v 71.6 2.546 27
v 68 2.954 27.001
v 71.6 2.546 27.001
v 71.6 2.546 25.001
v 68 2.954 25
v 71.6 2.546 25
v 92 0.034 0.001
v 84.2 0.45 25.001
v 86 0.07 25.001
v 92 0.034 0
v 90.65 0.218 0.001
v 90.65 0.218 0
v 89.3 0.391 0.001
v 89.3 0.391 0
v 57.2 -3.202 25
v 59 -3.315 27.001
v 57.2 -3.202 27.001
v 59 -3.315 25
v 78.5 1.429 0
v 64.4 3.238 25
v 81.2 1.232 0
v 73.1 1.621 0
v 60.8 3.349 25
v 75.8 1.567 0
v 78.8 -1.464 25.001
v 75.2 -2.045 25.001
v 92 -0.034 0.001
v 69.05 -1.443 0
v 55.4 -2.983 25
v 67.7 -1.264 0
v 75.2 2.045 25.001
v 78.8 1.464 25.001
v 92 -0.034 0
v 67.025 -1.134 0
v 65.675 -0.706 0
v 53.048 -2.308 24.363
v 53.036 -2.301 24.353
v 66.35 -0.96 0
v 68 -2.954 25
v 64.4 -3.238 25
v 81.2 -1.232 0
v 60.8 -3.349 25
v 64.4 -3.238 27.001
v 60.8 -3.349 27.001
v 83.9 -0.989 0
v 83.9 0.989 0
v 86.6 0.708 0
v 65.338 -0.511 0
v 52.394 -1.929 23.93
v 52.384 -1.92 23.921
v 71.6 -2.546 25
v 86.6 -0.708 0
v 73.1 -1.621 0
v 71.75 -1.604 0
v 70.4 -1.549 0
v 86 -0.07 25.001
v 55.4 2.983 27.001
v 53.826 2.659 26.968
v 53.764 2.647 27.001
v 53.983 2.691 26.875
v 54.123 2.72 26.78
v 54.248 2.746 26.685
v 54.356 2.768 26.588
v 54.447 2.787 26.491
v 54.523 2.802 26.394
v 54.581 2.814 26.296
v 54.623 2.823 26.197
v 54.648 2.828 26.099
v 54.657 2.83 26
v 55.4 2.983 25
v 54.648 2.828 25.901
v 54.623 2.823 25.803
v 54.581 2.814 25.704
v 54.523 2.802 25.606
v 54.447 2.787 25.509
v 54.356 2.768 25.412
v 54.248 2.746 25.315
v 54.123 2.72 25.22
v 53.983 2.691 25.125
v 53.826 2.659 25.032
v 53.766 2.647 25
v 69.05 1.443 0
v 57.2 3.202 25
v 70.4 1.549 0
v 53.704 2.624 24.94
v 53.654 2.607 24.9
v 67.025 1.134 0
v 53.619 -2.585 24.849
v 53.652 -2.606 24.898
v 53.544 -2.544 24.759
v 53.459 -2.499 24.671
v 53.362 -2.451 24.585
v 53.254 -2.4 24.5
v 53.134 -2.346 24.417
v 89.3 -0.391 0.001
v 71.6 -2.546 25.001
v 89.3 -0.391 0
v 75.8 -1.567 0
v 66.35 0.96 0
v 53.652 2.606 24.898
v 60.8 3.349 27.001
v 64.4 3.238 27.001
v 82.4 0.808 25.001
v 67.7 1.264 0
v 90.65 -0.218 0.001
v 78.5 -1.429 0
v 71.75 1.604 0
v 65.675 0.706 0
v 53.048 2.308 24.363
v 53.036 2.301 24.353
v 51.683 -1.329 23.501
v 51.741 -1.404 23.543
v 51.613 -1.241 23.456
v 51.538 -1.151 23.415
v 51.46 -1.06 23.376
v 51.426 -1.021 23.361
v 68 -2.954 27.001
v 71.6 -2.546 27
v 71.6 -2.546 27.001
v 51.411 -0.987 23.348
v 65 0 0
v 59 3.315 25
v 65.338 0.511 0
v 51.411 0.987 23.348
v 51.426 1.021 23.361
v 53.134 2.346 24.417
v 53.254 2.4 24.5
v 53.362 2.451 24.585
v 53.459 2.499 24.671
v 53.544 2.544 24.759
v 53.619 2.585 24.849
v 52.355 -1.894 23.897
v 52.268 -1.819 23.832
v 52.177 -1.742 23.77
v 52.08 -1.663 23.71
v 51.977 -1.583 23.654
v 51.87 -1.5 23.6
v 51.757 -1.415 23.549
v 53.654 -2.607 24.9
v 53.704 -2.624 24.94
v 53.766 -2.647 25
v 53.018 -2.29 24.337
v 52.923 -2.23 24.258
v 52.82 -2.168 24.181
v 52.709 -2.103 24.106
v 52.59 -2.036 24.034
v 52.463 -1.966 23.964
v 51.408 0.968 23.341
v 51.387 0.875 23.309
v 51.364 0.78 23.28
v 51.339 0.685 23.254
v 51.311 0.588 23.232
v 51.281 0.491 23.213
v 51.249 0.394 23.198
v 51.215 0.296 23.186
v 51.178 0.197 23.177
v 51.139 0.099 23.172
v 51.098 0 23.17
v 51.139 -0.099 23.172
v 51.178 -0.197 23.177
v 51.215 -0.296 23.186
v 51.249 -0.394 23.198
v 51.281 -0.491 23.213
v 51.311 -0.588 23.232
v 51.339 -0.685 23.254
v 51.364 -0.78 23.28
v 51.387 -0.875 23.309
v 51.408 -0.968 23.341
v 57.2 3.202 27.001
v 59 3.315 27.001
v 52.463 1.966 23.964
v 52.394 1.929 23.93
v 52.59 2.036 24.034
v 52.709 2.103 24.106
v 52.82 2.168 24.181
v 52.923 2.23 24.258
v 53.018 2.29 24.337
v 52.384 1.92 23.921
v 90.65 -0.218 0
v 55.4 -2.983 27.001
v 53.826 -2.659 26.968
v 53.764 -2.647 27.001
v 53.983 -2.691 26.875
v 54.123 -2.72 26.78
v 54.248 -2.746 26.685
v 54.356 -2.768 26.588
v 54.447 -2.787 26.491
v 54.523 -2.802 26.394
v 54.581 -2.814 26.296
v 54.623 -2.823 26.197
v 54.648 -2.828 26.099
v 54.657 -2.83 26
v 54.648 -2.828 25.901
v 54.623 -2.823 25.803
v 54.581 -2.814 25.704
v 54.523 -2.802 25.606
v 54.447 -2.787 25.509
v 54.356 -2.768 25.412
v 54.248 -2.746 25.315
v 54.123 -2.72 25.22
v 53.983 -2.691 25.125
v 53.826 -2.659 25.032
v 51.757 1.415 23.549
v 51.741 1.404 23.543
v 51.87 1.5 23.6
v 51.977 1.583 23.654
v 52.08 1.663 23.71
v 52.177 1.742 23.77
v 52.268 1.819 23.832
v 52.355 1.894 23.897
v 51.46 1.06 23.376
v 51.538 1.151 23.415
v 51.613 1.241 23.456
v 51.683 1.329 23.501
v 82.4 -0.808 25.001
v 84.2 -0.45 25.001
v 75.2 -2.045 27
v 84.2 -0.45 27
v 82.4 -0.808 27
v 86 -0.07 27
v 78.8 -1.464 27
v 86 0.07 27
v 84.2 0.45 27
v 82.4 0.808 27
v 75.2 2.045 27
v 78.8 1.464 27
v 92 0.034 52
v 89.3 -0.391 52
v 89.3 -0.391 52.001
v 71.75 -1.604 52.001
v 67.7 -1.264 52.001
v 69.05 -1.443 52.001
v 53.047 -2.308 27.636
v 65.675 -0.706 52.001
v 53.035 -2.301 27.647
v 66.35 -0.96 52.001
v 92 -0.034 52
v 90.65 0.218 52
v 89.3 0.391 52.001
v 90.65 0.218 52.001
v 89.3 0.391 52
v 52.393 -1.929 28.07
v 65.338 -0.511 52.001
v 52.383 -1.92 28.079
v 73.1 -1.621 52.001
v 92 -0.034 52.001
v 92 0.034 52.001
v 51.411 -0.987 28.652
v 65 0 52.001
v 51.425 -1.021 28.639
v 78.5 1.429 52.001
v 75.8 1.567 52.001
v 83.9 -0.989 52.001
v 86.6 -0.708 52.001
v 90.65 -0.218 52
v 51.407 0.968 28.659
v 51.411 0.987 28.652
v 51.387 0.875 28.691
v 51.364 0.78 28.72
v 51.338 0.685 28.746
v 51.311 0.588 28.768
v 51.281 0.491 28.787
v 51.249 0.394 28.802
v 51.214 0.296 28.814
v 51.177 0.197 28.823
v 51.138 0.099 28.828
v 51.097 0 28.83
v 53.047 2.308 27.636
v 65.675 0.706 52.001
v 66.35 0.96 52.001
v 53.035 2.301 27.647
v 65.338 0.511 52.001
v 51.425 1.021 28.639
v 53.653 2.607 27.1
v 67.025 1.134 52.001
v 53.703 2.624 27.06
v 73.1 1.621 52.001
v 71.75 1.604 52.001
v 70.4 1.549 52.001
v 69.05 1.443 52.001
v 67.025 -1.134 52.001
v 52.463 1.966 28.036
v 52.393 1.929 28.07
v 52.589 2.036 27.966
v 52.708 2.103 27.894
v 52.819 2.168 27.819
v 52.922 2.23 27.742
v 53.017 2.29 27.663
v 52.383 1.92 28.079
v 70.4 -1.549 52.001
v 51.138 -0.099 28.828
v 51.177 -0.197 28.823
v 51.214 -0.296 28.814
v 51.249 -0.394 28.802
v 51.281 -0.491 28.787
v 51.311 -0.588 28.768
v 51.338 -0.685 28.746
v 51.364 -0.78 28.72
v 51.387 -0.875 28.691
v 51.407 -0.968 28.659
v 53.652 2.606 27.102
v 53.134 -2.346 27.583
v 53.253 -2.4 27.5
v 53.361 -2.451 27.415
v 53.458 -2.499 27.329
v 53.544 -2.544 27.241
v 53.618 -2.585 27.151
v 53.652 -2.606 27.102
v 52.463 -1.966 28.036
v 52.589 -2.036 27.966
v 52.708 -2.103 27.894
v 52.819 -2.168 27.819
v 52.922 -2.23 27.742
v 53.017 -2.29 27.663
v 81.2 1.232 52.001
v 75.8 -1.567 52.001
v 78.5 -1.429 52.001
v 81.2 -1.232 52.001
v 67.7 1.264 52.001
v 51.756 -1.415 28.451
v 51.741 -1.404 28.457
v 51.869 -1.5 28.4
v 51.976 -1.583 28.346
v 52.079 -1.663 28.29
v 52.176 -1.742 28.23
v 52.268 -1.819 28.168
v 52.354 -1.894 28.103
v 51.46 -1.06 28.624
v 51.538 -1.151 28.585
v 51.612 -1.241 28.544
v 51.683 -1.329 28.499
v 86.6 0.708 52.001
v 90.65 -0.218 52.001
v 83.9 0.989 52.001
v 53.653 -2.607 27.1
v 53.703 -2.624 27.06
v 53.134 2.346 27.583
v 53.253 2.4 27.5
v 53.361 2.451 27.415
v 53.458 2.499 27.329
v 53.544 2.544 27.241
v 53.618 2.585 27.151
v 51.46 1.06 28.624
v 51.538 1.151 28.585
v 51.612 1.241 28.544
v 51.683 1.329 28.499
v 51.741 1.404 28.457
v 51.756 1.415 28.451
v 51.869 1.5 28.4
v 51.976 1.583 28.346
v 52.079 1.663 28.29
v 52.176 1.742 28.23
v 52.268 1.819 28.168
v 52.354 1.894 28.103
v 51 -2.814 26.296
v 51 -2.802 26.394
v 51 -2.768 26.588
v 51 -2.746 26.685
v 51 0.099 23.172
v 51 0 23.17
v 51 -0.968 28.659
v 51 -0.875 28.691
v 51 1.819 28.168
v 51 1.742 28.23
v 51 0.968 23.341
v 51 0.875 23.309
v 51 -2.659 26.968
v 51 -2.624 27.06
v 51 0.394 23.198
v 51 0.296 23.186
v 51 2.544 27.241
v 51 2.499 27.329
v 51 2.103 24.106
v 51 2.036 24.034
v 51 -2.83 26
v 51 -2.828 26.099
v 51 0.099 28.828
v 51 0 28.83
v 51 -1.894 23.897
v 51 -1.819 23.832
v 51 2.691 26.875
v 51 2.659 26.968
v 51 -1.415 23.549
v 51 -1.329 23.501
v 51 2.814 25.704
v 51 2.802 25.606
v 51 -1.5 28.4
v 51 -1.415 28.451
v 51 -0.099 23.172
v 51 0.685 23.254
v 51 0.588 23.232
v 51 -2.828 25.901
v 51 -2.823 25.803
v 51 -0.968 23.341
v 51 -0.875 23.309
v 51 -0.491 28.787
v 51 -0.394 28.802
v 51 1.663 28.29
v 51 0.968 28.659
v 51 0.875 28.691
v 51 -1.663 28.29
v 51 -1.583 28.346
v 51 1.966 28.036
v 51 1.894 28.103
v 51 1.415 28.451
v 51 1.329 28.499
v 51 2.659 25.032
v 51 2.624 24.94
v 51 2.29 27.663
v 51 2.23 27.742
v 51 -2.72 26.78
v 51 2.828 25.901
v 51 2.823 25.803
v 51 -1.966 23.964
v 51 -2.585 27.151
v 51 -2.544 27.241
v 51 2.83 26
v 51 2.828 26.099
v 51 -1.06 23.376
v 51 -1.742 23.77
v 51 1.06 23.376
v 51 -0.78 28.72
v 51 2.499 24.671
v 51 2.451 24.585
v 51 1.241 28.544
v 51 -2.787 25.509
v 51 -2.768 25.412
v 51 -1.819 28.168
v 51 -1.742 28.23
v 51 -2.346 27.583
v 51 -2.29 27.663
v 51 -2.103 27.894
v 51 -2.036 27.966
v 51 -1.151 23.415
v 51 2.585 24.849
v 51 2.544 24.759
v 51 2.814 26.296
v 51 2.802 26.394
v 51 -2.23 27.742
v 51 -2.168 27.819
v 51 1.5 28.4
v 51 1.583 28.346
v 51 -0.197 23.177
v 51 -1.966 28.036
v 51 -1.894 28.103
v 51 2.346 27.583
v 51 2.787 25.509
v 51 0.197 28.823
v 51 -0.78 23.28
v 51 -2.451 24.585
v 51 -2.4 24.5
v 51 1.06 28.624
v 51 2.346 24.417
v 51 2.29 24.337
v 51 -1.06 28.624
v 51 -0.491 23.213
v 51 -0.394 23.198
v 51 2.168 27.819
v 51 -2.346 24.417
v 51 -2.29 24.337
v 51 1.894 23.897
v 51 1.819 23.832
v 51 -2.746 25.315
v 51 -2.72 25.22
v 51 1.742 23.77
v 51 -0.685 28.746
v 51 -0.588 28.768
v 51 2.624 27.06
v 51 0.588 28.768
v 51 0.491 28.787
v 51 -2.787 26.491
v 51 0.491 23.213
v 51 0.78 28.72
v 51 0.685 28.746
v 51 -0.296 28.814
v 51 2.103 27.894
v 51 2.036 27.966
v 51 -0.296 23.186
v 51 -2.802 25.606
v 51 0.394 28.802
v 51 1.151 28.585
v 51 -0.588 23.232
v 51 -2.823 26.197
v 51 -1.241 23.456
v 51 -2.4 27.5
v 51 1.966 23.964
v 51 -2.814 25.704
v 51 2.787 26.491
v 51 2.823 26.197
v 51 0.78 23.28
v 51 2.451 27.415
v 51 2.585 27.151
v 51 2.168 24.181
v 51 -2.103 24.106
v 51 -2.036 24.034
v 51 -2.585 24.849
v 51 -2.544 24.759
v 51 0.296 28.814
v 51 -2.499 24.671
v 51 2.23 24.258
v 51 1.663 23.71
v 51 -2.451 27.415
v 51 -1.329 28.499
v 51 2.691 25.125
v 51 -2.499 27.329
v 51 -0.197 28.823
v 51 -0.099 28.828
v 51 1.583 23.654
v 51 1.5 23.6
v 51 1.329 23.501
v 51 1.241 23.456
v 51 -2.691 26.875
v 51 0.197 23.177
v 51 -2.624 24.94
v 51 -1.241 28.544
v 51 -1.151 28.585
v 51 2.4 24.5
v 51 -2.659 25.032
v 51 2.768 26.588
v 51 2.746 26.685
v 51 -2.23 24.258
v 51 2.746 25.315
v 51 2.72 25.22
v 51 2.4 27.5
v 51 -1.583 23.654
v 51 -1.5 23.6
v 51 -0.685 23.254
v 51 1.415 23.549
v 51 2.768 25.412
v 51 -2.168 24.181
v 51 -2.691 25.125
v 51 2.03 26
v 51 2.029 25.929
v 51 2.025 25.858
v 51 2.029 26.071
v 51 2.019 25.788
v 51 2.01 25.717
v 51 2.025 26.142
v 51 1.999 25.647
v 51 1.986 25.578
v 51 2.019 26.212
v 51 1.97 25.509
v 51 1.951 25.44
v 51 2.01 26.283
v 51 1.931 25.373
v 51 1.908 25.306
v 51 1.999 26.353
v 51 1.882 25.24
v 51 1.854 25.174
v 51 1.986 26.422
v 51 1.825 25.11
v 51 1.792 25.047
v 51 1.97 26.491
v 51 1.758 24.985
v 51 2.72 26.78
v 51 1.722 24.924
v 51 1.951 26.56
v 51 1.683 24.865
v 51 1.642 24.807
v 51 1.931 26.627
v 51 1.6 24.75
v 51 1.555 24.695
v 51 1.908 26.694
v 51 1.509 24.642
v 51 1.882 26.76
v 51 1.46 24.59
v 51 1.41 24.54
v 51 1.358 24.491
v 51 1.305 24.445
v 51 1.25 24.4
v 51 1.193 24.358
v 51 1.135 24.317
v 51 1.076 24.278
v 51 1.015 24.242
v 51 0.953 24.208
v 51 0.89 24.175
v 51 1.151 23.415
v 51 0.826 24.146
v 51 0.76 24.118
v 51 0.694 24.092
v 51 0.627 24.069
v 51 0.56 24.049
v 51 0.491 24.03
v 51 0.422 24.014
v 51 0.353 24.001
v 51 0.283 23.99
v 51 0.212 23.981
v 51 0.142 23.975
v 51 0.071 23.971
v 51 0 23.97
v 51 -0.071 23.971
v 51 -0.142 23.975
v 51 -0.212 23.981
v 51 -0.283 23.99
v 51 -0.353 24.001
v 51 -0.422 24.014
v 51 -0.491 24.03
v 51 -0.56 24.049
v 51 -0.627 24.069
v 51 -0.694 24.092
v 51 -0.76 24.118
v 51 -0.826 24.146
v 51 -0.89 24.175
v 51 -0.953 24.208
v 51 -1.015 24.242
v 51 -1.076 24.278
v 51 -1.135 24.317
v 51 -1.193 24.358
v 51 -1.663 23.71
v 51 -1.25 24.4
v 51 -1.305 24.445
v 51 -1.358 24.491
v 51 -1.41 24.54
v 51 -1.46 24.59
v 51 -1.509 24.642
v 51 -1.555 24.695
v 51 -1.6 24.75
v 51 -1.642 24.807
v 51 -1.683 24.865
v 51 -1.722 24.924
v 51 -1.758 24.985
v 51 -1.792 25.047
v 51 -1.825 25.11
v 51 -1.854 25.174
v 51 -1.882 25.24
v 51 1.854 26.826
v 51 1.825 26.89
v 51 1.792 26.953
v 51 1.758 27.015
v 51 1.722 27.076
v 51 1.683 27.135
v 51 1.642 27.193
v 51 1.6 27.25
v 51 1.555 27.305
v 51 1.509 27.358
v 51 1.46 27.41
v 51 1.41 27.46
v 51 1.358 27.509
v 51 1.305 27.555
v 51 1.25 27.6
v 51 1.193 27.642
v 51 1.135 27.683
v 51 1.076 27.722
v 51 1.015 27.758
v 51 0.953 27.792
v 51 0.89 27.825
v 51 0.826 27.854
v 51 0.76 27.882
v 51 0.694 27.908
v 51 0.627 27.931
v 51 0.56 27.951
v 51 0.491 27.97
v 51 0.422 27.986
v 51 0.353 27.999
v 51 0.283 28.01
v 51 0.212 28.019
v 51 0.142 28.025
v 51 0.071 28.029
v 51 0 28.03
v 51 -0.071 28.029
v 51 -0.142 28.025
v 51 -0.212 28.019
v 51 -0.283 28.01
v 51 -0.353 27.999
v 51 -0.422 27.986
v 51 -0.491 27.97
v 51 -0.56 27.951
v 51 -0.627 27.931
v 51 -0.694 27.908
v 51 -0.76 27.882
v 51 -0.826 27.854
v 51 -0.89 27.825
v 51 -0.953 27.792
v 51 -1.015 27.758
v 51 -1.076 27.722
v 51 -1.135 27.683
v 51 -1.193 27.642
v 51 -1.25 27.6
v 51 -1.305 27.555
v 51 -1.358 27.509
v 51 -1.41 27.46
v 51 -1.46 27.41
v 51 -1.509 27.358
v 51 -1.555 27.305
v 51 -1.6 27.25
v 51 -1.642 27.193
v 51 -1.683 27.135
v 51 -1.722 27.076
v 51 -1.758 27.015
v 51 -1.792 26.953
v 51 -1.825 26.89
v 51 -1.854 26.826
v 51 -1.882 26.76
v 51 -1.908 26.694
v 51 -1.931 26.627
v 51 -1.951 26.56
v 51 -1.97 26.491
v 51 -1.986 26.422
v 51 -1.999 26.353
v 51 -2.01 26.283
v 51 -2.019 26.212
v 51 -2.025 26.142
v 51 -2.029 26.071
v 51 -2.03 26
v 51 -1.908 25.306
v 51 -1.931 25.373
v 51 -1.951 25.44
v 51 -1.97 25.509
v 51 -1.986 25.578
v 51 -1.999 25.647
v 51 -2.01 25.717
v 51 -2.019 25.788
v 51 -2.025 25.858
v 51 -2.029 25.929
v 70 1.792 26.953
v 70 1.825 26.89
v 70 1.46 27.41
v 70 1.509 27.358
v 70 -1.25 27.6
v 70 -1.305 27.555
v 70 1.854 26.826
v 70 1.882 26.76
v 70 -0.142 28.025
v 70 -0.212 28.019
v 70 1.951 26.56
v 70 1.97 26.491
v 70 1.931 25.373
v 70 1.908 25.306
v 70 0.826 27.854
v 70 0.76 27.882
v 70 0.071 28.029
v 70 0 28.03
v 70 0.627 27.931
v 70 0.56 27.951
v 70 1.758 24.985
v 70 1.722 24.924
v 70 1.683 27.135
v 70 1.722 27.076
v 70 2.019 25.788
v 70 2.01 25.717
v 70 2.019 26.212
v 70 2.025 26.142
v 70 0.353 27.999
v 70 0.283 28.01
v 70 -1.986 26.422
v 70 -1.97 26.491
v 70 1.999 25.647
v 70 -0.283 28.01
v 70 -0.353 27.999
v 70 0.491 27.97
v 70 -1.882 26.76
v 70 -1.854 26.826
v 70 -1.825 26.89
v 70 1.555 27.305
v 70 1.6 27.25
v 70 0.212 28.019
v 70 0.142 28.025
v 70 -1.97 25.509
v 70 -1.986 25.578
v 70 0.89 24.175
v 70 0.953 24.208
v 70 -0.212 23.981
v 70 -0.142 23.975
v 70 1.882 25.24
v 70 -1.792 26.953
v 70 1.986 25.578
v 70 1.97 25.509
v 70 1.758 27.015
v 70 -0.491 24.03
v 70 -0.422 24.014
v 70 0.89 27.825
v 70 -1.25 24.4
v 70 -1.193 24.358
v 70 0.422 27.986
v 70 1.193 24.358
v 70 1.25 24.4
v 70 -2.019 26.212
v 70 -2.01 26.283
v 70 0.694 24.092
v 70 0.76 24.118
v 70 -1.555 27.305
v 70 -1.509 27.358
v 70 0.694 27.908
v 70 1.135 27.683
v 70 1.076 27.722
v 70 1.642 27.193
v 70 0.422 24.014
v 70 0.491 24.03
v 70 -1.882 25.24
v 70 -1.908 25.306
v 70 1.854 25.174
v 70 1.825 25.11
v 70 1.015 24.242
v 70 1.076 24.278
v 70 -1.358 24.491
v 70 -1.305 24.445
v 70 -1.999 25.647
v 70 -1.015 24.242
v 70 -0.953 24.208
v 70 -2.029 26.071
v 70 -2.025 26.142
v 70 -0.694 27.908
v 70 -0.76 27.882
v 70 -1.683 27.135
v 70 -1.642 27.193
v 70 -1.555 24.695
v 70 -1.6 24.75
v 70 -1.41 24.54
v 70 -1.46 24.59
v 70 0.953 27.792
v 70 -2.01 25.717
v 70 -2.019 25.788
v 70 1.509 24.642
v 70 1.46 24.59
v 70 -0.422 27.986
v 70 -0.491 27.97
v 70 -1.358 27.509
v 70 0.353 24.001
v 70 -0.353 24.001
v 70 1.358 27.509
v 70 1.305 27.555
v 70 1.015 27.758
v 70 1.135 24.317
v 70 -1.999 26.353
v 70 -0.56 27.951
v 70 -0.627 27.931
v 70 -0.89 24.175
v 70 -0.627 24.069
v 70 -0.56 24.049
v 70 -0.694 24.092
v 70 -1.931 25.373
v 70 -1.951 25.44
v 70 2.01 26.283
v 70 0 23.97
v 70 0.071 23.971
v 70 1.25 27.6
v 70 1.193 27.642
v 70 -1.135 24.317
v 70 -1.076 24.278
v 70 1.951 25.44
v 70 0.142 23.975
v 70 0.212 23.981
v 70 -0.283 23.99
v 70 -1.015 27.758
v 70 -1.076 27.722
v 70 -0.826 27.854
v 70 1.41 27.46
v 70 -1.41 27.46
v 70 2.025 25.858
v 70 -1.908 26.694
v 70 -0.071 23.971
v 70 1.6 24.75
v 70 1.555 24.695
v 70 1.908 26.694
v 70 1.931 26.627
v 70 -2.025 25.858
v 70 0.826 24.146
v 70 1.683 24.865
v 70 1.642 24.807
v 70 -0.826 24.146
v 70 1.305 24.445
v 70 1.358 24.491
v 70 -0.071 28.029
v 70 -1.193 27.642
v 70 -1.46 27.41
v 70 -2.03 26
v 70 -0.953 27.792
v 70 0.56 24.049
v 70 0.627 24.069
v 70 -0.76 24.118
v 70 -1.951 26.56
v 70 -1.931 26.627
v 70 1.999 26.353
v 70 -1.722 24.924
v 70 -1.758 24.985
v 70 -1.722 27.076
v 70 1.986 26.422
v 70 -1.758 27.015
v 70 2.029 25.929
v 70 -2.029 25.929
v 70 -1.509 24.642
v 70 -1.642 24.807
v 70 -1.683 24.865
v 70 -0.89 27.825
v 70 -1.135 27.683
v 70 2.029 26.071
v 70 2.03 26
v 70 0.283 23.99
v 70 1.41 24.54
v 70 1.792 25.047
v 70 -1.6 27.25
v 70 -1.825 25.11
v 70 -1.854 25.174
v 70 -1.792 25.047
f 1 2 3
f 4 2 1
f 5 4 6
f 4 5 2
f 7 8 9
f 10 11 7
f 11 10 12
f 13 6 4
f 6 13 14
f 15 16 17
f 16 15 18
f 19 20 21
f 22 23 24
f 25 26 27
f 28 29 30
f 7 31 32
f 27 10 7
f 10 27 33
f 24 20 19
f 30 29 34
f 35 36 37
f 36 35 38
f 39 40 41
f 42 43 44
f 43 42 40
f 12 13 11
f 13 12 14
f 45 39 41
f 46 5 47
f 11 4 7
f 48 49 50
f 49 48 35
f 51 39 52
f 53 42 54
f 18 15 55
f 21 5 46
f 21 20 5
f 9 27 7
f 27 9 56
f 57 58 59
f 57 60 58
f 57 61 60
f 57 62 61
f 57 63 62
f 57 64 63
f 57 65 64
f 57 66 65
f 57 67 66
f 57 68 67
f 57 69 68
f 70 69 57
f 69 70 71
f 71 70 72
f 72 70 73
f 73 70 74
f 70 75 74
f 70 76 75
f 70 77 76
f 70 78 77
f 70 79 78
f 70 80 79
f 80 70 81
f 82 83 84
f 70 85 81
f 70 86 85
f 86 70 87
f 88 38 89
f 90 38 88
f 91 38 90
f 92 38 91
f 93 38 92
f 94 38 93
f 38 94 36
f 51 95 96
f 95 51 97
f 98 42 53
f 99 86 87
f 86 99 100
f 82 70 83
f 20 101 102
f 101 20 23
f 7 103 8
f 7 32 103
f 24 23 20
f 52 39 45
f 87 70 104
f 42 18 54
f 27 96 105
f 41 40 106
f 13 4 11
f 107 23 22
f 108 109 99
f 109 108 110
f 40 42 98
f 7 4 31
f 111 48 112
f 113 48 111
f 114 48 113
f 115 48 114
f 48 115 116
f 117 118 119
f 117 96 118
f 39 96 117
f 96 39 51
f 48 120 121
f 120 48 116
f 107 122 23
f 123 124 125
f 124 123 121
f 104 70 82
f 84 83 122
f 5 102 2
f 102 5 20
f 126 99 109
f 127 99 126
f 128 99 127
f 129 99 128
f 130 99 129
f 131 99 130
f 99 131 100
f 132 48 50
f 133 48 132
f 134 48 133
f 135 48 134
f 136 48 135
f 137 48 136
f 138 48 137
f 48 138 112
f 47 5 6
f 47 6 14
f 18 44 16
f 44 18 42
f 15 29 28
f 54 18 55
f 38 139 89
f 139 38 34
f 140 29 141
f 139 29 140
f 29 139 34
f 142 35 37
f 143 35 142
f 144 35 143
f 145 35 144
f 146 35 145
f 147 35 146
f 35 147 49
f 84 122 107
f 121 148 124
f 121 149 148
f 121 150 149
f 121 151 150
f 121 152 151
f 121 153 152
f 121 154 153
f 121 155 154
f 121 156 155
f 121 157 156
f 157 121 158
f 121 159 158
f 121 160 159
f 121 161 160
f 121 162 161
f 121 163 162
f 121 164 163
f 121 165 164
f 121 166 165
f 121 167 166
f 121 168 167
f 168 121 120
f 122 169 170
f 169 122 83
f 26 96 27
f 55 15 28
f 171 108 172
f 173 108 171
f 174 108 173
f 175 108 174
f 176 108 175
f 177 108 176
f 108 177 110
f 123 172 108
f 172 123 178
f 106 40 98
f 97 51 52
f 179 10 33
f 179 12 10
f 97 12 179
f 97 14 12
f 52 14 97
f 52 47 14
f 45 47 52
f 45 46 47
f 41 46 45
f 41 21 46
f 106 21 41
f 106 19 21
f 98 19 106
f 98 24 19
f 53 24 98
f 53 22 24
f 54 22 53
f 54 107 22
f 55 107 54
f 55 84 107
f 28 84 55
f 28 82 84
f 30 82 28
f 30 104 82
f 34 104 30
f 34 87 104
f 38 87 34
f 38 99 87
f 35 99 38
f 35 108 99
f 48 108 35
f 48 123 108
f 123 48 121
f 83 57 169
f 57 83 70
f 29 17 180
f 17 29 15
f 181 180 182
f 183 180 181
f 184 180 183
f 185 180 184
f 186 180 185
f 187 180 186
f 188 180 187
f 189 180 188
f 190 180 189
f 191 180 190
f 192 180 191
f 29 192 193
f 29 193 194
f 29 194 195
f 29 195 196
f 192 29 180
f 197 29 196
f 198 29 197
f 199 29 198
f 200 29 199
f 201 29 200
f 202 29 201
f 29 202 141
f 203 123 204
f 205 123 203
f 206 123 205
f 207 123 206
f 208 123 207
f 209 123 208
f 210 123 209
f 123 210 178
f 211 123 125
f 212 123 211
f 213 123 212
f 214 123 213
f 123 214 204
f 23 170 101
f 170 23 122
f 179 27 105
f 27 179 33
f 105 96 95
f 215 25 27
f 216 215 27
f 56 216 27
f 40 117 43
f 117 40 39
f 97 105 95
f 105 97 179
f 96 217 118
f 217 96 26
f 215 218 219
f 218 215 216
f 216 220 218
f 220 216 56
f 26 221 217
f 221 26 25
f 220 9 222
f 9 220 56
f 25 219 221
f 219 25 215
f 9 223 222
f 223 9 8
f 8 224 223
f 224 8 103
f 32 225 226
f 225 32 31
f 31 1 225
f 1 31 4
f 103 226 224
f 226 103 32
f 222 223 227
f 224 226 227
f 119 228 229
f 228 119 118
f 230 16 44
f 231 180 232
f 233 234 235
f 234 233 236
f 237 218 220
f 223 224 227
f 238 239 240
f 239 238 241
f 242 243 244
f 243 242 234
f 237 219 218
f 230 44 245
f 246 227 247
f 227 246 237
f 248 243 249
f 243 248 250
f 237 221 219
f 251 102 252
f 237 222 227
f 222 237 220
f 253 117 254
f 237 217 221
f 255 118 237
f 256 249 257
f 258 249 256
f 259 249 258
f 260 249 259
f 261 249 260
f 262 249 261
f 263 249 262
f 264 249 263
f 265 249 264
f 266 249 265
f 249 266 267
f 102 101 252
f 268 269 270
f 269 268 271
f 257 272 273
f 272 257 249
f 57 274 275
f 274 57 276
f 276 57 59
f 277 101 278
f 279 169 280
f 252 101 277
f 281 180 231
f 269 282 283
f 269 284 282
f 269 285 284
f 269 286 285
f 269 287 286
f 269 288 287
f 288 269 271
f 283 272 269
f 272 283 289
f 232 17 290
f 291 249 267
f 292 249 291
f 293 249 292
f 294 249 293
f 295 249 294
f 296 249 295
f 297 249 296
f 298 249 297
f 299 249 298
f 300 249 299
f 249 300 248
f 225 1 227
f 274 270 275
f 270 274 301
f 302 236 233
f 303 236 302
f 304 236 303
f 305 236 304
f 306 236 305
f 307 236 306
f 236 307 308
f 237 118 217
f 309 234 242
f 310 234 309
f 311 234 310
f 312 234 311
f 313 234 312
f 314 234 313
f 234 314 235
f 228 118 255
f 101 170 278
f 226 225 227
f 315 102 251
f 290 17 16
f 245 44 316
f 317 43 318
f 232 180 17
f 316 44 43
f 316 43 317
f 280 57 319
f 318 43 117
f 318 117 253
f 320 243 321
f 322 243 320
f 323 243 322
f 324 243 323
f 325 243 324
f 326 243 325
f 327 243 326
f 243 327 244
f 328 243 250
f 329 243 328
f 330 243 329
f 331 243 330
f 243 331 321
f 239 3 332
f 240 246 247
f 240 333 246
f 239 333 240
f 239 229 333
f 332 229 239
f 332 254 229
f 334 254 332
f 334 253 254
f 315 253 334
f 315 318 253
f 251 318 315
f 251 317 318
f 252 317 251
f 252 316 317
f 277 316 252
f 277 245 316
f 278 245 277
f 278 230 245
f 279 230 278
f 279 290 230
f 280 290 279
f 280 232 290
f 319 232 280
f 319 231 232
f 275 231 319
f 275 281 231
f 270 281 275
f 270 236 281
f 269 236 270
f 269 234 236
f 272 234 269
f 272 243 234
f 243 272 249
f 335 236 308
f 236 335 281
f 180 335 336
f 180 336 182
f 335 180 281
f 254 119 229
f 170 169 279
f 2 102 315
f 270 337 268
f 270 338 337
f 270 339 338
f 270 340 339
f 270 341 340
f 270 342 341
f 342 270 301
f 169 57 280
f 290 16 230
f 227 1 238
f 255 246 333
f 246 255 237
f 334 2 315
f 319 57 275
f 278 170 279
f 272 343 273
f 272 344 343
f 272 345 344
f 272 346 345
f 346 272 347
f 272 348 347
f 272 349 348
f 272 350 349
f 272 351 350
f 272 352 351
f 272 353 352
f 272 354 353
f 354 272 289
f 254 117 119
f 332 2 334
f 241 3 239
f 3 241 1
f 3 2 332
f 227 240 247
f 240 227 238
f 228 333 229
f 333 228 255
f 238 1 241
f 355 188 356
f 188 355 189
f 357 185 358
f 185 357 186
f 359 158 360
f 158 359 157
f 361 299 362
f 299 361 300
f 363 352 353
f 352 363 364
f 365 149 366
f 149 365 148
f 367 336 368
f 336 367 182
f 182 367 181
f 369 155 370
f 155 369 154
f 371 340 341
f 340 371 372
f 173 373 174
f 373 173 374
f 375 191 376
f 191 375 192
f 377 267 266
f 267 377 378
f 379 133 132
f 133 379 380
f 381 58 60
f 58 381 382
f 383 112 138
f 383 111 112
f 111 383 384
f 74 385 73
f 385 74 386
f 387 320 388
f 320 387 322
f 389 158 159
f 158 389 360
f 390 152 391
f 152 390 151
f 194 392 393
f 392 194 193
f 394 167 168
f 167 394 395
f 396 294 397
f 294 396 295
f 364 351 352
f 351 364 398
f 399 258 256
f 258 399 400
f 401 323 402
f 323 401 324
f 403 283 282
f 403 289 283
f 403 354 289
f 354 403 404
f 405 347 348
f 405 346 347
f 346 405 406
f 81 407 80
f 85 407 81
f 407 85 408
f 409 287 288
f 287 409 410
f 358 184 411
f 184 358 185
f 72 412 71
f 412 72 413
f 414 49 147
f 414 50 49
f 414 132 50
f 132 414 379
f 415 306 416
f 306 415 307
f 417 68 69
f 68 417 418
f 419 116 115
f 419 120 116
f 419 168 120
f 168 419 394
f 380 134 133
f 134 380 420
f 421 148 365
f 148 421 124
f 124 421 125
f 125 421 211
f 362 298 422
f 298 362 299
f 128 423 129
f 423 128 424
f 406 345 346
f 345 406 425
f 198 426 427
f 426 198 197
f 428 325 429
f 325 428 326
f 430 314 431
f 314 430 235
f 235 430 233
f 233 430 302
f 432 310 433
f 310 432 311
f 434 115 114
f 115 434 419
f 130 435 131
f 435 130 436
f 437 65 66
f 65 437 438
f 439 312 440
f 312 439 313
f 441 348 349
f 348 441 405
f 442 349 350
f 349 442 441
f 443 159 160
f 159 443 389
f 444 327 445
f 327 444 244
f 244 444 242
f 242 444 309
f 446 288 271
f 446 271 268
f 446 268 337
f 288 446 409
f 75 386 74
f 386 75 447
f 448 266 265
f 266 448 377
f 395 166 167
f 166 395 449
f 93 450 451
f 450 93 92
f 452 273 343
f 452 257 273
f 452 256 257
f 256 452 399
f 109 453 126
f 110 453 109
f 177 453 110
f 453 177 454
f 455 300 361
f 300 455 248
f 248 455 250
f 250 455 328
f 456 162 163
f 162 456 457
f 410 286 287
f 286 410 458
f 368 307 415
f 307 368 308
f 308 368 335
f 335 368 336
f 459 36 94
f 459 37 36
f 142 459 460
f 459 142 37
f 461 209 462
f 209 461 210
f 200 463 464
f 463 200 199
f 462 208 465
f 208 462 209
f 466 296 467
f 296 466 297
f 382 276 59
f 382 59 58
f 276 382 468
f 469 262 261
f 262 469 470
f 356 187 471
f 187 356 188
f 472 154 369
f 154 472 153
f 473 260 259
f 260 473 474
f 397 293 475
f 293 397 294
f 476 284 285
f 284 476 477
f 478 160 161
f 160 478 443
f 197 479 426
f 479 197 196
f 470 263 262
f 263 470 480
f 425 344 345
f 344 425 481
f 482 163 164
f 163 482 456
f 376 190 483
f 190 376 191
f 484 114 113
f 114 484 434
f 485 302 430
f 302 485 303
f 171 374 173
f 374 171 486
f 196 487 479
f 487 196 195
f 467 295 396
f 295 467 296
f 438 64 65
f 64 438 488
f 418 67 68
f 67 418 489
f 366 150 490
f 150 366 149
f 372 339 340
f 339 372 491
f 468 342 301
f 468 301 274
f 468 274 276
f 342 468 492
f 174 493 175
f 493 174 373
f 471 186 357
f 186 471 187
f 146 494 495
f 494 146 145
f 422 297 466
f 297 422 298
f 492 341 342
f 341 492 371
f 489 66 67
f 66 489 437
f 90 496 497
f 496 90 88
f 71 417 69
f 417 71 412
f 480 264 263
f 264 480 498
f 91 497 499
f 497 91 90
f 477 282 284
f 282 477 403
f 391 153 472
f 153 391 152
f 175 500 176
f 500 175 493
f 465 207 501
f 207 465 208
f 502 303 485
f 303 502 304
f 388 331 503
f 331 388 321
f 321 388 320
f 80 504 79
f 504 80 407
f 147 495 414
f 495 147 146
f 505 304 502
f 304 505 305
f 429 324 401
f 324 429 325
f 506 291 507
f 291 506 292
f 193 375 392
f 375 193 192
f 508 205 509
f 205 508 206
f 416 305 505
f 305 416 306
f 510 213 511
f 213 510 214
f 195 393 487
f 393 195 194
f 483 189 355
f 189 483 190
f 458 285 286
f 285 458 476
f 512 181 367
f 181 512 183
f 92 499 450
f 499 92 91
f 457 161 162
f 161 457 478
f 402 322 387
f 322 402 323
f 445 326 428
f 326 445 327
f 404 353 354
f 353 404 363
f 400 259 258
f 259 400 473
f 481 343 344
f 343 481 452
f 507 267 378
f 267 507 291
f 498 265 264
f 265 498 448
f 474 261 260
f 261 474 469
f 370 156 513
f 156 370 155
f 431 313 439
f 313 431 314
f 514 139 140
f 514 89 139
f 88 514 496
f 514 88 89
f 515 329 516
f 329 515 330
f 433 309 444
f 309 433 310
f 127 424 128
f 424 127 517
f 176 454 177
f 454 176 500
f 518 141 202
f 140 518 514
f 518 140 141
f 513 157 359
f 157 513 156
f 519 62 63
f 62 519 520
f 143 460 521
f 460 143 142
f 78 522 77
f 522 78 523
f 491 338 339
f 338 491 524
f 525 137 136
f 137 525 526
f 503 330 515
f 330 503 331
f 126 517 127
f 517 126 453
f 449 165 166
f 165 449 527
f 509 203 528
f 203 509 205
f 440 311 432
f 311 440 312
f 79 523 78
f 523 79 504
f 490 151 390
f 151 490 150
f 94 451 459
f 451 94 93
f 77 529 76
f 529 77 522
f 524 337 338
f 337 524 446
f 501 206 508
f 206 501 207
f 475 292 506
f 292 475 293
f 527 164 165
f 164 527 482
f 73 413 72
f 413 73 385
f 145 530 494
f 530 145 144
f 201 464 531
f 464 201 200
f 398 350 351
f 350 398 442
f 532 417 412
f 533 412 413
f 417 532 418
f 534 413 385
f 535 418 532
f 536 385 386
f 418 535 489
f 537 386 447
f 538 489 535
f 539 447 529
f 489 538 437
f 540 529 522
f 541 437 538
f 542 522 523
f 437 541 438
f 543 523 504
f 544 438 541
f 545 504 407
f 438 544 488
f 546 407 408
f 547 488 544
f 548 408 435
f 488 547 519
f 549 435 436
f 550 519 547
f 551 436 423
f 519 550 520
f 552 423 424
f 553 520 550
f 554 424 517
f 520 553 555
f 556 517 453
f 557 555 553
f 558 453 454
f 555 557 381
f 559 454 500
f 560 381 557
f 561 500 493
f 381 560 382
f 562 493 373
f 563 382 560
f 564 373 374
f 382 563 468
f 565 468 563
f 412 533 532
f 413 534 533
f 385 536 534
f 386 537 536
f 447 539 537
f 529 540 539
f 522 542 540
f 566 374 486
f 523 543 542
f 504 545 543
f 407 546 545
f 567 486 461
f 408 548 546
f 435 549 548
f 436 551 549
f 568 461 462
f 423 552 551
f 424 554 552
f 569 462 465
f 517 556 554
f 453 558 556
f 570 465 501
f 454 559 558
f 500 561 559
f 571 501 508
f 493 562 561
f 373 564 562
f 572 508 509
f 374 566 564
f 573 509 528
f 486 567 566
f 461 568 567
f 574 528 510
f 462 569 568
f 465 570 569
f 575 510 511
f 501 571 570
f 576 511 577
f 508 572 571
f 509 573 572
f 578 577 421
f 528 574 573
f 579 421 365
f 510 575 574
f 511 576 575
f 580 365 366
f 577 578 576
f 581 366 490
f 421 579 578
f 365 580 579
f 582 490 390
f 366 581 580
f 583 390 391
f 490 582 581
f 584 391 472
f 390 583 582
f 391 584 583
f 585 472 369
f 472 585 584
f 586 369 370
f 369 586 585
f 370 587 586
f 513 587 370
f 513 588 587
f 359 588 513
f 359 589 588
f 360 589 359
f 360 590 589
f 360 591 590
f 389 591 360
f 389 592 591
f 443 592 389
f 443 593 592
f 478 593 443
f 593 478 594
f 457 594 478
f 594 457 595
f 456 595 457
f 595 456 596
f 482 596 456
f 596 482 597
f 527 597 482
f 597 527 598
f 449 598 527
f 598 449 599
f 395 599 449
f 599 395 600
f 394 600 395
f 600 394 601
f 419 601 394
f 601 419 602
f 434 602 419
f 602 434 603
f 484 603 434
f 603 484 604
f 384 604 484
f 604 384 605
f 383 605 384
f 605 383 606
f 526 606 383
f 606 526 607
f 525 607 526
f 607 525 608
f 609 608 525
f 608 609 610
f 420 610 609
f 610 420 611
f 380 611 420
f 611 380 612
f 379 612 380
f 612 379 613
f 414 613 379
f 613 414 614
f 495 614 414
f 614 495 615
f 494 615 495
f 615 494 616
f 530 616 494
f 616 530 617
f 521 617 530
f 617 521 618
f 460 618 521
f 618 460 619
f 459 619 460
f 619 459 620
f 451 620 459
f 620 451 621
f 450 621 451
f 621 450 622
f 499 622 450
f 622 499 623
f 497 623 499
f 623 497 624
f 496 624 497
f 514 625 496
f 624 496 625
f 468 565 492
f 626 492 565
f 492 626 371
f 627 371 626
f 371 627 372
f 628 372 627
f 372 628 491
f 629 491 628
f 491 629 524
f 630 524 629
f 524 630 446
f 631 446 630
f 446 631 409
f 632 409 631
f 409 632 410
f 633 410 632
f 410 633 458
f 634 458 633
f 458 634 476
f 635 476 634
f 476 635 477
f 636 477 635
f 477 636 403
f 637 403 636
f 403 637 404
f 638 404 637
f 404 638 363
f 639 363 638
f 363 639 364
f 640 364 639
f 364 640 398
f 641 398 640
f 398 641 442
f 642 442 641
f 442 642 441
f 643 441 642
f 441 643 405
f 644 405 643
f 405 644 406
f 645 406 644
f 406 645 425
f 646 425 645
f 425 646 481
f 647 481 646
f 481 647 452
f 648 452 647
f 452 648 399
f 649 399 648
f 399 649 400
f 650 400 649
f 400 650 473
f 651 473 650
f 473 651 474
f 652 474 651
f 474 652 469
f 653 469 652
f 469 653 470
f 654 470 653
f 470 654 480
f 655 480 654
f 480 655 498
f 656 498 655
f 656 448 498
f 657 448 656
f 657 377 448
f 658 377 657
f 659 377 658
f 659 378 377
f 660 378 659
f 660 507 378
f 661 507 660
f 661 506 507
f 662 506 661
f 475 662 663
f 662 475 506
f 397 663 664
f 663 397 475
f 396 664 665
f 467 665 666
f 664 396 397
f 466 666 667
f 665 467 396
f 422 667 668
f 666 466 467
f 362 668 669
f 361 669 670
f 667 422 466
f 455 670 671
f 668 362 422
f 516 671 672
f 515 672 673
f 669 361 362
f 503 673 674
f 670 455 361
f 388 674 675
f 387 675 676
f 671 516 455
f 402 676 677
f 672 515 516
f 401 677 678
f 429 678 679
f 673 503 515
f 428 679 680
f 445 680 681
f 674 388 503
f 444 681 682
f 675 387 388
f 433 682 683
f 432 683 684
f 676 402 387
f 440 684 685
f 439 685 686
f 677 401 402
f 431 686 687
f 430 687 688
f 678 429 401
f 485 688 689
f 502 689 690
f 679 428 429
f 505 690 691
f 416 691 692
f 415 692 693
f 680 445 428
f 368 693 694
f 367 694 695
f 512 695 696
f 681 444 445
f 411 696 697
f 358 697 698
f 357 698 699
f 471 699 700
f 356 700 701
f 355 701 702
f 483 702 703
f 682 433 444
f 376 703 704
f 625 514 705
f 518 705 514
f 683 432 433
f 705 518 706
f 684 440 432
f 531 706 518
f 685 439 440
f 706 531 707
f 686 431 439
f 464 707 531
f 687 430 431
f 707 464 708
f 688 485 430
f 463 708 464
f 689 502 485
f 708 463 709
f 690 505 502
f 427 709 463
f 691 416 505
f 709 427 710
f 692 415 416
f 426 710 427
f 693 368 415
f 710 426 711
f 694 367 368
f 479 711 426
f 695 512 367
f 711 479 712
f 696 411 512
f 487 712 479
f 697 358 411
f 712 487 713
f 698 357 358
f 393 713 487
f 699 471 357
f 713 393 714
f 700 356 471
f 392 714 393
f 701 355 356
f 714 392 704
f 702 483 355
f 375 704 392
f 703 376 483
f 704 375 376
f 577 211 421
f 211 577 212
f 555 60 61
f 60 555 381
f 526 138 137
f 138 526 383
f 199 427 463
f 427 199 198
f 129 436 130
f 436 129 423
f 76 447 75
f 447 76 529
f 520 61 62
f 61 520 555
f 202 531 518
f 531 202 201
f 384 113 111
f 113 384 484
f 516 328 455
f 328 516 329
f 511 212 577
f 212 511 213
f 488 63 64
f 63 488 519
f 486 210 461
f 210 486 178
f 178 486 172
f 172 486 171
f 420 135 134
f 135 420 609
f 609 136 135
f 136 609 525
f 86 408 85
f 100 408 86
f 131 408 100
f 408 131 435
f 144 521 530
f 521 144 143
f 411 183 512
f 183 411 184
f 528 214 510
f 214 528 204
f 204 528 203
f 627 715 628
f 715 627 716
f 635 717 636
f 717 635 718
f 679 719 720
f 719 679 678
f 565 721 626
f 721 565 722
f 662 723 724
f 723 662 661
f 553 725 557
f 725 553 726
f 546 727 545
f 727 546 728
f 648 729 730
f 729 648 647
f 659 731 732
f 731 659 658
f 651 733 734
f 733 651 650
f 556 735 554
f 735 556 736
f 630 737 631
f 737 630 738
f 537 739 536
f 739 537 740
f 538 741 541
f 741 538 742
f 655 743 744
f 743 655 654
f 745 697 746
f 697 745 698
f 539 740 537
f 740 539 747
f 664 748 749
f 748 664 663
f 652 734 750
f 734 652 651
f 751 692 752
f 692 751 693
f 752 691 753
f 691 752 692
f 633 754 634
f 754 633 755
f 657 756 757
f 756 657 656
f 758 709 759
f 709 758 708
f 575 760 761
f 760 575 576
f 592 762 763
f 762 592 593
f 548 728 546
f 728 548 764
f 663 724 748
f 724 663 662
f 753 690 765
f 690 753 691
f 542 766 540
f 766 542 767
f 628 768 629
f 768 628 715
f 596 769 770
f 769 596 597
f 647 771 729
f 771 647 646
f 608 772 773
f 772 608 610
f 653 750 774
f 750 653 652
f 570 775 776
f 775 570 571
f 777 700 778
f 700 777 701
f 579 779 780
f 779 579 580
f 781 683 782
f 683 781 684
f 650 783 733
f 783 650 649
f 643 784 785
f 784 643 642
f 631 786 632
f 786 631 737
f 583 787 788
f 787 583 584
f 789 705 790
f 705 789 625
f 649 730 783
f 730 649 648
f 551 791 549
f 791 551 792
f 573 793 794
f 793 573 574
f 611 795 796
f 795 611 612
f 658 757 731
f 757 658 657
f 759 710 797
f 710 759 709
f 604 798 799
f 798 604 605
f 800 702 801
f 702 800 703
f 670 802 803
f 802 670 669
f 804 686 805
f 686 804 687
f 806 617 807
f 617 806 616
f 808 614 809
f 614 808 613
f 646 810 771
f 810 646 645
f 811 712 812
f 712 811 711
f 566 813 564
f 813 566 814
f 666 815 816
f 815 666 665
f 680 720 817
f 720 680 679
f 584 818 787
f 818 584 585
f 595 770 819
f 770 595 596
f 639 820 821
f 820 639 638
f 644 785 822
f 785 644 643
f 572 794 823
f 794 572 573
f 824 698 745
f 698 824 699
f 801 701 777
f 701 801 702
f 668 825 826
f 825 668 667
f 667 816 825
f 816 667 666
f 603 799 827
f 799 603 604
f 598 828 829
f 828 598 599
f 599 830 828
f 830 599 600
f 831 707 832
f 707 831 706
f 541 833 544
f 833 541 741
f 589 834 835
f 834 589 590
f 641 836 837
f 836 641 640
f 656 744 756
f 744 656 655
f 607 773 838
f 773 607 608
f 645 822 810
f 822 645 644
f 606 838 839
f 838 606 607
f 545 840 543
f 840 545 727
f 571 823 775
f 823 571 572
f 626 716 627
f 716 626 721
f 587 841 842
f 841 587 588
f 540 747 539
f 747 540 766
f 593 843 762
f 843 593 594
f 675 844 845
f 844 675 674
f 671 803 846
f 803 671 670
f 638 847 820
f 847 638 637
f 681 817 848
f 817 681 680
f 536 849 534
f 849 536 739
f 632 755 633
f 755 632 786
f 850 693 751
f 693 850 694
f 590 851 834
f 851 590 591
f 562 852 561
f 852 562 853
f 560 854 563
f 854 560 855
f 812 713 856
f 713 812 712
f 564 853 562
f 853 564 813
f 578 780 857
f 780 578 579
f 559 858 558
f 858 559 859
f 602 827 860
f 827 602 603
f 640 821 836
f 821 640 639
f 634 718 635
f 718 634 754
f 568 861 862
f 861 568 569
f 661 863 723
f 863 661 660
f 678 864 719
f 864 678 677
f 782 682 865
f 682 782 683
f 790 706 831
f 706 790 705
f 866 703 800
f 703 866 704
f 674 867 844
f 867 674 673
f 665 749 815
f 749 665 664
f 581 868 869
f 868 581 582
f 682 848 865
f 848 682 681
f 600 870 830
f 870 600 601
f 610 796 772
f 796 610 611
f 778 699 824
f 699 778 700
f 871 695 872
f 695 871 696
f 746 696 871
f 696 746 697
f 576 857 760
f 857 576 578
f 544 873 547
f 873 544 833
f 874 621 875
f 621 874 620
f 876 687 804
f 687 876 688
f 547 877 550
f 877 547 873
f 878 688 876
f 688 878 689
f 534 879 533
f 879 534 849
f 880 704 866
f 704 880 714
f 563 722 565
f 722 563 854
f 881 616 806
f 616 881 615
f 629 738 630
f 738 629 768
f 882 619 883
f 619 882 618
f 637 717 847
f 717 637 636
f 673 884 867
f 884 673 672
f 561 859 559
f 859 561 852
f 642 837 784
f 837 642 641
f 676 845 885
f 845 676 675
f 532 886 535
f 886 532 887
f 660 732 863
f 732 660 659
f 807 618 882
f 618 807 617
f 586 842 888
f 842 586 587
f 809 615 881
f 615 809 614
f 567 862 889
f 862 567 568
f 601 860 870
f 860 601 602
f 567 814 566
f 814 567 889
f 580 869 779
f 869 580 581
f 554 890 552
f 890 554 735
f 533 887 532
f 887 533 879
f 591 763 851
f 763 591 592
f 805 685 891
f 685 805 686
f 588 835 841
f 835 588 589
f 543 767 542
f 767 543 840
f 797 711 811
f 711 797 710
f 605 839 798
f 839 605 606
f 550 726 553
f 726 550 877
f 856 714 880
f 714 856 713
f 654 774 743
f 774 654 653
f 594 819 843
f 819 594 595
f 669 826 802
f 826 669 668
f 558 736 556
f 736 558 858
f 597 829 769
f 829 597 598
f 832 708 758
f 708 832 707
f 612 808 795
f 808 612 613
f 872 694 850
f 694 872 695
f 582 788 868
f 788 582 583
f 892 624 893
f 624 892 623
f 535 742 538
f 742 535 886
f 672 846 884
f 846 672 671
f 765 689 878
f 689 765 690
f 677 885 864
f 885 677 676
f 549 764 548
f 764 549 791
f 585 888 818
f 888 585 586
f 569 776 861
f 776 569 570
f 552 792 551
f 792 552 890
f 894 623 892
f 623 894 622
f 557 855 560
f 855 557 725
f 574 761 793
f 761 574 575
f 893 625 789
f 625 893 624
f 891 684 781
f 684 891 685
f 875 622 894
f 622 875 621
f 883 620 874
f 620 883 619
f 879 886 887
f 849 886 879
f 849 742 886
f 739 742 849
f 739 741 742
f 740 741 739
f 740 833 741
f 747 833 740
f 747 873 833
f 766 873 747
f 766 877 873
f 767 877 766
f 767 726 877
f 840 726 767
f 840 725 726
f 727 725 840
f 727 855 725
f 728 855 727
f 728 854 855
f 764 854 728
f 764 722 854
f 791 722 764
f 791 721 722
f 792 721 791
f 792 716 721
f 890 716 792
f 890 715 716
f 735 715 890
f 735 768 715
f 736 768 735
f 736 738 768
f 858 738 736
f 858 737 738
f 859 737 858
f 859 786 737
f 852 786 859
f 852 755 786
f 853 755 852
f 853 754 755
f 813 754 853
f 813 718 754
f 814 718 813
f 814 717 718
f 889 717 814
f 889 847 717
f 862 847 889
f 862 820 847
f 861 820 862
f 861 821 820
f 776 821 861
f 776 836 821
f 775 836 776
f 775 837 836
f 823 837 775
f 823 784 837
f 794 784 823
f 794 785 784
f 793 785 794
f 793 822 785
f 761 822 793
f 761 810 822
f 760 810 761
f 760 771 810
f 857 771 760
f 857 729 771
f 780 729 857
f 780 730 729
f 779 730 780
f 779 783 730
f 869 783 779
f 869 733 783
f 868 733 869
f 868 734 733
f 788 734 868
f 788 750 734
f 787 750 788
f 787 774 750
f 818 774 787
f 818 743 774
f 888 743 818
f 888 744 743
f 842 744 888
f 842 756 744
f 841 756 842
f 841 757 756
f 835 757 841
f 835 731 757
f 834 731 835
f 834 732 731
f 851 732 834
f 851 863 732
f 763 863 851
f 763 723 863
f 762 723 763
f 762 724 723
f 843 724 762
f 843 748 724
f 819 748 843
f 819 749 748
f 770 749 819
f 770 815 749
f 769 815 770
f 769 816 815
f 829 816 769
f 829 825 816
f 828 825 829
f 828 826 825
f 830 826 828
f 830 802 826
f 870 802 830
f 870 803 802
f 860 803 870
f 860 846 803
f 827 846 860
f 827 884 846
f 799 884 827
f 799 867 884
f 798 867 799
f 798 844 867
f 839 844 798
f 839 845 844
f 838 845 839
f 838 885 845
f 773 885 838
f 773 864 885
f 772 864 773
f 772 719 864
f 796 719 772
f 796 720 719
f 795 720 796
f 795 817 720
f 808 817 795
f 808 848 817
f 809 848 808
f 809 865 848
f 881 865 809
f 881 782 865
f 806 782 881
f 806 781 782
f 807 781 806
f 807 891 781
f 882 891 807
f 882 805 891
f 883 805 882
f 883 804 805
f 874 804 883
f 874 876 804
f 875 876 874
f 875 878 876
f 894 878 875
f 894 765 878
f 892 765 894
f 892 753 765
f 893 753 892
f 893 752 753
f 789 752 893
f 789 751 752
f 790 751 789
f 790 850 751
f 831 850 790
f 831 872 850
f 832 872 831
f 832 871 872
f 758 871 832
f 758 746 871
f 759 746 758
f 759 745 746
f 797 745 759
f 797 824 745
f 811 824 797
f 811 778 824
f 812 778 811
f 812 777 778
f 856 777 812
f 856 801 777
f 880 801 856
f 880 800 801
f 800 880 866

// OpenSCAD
big = 1000;
lil = 0.001;
res = 1;

tail1OS = [65,0,0];
tail1Scale = [0.6, 0.3, 1];
tail2OS = [50,0,25];
tail2Scale = [0.8, 0.62, 1];
tail3OS = [65,0,50];
tail3Scale = [0.6, 0.3, 1];

gutsOS = [0,0,2];
gutsScale = [1, 0.4, 1];

rodOS = [60,0,tail2OS[2] + gutsOS[2]/2];
rodR = 2.03;
rodL = 9;
rodSkin = 0.8;

module tail2Pos(){
    
    chord_len = 45;
    NACA0024=[[1.0000,0.00252],[0.9500,0.01613],[0.9000,0.02896],[0.8000,0.05247],[0.7000,0.07328],[0.6000,0.09127],[0.5000,0.10588],[0.4000,0.11607],[0.3000,0.12004],[0.2500,0.11883],[0.2000,0.11475],[0.1500,0.10691],[0.1000,0.09365],[0.0750,0.08400],[0.0500,0.07109],[0.0250,0.05229],[0.0125,0.03788],[0.0000,0.00000],[0.0125,-0.03788],[0.0250,-0.05229],[0.0500,-0.07109],[0.0750,-0.08400],[0.1000,-0.09365],[0.1500,-0.10691],[0.2000,-0.11475],[0.2500,-0.11883],[0.3000,-0.12004],[0.4000,-0.11607],[0.5000,-0.10588],[0.6000,-0.09127],[0.7000,-0.07328],[0.8000,-0.05247],[0.9000,-0.02896],[0.9500,-0.01613],[1.0000,-0.00252]];
    hull(){
        translate(tail1OS) scale(tail1Scale) linear_extrude(height = lil) polygon(points=chord_len*NACA0024);
        translate(tail2OS) scale(tail2Scale) linear_extrude(height = lil) polygon(points=chord_len*NACA0024);
    }
    hull(){
        translate(tail2OS) scale(tail2Scale) linear_extrude(height = lil) polygon(points=chord_len*NACA0024);
        translate(tail2OS + gutsOS) scale(tail2Scale) linear_extrude(height = lil) polygon(points=chord_len*NACA0024);
    }
    hull(){
        translate(tail2OS + gutsOS) scale(tail2Scale) linear_extrude(height = lil) polygon(points=chord_len*NACA0024);
        translate(tail3OS + gutsOS) scale(tail3Scale) linear_extrude(height = lil) polygon(points=chord_len*NACA0024);
    }
    
    translate(rodOS) rotate([0,-90,0]) cylinder(r = rodR+rodSkin, h = rodL, $fn = res * 180);
}


module tail2Neg(){
    translate(rodOS + [10,0,0]) rotate([0,-90,0]) cylinder(r = rodR, h = big, $fn = res * 180);
    translate([-big/2 + rodOS[0] - rodL,0,0]) cube(size = big, center = true);
}

difference(){
    tail2Pos();
    tail2Neg();
}
